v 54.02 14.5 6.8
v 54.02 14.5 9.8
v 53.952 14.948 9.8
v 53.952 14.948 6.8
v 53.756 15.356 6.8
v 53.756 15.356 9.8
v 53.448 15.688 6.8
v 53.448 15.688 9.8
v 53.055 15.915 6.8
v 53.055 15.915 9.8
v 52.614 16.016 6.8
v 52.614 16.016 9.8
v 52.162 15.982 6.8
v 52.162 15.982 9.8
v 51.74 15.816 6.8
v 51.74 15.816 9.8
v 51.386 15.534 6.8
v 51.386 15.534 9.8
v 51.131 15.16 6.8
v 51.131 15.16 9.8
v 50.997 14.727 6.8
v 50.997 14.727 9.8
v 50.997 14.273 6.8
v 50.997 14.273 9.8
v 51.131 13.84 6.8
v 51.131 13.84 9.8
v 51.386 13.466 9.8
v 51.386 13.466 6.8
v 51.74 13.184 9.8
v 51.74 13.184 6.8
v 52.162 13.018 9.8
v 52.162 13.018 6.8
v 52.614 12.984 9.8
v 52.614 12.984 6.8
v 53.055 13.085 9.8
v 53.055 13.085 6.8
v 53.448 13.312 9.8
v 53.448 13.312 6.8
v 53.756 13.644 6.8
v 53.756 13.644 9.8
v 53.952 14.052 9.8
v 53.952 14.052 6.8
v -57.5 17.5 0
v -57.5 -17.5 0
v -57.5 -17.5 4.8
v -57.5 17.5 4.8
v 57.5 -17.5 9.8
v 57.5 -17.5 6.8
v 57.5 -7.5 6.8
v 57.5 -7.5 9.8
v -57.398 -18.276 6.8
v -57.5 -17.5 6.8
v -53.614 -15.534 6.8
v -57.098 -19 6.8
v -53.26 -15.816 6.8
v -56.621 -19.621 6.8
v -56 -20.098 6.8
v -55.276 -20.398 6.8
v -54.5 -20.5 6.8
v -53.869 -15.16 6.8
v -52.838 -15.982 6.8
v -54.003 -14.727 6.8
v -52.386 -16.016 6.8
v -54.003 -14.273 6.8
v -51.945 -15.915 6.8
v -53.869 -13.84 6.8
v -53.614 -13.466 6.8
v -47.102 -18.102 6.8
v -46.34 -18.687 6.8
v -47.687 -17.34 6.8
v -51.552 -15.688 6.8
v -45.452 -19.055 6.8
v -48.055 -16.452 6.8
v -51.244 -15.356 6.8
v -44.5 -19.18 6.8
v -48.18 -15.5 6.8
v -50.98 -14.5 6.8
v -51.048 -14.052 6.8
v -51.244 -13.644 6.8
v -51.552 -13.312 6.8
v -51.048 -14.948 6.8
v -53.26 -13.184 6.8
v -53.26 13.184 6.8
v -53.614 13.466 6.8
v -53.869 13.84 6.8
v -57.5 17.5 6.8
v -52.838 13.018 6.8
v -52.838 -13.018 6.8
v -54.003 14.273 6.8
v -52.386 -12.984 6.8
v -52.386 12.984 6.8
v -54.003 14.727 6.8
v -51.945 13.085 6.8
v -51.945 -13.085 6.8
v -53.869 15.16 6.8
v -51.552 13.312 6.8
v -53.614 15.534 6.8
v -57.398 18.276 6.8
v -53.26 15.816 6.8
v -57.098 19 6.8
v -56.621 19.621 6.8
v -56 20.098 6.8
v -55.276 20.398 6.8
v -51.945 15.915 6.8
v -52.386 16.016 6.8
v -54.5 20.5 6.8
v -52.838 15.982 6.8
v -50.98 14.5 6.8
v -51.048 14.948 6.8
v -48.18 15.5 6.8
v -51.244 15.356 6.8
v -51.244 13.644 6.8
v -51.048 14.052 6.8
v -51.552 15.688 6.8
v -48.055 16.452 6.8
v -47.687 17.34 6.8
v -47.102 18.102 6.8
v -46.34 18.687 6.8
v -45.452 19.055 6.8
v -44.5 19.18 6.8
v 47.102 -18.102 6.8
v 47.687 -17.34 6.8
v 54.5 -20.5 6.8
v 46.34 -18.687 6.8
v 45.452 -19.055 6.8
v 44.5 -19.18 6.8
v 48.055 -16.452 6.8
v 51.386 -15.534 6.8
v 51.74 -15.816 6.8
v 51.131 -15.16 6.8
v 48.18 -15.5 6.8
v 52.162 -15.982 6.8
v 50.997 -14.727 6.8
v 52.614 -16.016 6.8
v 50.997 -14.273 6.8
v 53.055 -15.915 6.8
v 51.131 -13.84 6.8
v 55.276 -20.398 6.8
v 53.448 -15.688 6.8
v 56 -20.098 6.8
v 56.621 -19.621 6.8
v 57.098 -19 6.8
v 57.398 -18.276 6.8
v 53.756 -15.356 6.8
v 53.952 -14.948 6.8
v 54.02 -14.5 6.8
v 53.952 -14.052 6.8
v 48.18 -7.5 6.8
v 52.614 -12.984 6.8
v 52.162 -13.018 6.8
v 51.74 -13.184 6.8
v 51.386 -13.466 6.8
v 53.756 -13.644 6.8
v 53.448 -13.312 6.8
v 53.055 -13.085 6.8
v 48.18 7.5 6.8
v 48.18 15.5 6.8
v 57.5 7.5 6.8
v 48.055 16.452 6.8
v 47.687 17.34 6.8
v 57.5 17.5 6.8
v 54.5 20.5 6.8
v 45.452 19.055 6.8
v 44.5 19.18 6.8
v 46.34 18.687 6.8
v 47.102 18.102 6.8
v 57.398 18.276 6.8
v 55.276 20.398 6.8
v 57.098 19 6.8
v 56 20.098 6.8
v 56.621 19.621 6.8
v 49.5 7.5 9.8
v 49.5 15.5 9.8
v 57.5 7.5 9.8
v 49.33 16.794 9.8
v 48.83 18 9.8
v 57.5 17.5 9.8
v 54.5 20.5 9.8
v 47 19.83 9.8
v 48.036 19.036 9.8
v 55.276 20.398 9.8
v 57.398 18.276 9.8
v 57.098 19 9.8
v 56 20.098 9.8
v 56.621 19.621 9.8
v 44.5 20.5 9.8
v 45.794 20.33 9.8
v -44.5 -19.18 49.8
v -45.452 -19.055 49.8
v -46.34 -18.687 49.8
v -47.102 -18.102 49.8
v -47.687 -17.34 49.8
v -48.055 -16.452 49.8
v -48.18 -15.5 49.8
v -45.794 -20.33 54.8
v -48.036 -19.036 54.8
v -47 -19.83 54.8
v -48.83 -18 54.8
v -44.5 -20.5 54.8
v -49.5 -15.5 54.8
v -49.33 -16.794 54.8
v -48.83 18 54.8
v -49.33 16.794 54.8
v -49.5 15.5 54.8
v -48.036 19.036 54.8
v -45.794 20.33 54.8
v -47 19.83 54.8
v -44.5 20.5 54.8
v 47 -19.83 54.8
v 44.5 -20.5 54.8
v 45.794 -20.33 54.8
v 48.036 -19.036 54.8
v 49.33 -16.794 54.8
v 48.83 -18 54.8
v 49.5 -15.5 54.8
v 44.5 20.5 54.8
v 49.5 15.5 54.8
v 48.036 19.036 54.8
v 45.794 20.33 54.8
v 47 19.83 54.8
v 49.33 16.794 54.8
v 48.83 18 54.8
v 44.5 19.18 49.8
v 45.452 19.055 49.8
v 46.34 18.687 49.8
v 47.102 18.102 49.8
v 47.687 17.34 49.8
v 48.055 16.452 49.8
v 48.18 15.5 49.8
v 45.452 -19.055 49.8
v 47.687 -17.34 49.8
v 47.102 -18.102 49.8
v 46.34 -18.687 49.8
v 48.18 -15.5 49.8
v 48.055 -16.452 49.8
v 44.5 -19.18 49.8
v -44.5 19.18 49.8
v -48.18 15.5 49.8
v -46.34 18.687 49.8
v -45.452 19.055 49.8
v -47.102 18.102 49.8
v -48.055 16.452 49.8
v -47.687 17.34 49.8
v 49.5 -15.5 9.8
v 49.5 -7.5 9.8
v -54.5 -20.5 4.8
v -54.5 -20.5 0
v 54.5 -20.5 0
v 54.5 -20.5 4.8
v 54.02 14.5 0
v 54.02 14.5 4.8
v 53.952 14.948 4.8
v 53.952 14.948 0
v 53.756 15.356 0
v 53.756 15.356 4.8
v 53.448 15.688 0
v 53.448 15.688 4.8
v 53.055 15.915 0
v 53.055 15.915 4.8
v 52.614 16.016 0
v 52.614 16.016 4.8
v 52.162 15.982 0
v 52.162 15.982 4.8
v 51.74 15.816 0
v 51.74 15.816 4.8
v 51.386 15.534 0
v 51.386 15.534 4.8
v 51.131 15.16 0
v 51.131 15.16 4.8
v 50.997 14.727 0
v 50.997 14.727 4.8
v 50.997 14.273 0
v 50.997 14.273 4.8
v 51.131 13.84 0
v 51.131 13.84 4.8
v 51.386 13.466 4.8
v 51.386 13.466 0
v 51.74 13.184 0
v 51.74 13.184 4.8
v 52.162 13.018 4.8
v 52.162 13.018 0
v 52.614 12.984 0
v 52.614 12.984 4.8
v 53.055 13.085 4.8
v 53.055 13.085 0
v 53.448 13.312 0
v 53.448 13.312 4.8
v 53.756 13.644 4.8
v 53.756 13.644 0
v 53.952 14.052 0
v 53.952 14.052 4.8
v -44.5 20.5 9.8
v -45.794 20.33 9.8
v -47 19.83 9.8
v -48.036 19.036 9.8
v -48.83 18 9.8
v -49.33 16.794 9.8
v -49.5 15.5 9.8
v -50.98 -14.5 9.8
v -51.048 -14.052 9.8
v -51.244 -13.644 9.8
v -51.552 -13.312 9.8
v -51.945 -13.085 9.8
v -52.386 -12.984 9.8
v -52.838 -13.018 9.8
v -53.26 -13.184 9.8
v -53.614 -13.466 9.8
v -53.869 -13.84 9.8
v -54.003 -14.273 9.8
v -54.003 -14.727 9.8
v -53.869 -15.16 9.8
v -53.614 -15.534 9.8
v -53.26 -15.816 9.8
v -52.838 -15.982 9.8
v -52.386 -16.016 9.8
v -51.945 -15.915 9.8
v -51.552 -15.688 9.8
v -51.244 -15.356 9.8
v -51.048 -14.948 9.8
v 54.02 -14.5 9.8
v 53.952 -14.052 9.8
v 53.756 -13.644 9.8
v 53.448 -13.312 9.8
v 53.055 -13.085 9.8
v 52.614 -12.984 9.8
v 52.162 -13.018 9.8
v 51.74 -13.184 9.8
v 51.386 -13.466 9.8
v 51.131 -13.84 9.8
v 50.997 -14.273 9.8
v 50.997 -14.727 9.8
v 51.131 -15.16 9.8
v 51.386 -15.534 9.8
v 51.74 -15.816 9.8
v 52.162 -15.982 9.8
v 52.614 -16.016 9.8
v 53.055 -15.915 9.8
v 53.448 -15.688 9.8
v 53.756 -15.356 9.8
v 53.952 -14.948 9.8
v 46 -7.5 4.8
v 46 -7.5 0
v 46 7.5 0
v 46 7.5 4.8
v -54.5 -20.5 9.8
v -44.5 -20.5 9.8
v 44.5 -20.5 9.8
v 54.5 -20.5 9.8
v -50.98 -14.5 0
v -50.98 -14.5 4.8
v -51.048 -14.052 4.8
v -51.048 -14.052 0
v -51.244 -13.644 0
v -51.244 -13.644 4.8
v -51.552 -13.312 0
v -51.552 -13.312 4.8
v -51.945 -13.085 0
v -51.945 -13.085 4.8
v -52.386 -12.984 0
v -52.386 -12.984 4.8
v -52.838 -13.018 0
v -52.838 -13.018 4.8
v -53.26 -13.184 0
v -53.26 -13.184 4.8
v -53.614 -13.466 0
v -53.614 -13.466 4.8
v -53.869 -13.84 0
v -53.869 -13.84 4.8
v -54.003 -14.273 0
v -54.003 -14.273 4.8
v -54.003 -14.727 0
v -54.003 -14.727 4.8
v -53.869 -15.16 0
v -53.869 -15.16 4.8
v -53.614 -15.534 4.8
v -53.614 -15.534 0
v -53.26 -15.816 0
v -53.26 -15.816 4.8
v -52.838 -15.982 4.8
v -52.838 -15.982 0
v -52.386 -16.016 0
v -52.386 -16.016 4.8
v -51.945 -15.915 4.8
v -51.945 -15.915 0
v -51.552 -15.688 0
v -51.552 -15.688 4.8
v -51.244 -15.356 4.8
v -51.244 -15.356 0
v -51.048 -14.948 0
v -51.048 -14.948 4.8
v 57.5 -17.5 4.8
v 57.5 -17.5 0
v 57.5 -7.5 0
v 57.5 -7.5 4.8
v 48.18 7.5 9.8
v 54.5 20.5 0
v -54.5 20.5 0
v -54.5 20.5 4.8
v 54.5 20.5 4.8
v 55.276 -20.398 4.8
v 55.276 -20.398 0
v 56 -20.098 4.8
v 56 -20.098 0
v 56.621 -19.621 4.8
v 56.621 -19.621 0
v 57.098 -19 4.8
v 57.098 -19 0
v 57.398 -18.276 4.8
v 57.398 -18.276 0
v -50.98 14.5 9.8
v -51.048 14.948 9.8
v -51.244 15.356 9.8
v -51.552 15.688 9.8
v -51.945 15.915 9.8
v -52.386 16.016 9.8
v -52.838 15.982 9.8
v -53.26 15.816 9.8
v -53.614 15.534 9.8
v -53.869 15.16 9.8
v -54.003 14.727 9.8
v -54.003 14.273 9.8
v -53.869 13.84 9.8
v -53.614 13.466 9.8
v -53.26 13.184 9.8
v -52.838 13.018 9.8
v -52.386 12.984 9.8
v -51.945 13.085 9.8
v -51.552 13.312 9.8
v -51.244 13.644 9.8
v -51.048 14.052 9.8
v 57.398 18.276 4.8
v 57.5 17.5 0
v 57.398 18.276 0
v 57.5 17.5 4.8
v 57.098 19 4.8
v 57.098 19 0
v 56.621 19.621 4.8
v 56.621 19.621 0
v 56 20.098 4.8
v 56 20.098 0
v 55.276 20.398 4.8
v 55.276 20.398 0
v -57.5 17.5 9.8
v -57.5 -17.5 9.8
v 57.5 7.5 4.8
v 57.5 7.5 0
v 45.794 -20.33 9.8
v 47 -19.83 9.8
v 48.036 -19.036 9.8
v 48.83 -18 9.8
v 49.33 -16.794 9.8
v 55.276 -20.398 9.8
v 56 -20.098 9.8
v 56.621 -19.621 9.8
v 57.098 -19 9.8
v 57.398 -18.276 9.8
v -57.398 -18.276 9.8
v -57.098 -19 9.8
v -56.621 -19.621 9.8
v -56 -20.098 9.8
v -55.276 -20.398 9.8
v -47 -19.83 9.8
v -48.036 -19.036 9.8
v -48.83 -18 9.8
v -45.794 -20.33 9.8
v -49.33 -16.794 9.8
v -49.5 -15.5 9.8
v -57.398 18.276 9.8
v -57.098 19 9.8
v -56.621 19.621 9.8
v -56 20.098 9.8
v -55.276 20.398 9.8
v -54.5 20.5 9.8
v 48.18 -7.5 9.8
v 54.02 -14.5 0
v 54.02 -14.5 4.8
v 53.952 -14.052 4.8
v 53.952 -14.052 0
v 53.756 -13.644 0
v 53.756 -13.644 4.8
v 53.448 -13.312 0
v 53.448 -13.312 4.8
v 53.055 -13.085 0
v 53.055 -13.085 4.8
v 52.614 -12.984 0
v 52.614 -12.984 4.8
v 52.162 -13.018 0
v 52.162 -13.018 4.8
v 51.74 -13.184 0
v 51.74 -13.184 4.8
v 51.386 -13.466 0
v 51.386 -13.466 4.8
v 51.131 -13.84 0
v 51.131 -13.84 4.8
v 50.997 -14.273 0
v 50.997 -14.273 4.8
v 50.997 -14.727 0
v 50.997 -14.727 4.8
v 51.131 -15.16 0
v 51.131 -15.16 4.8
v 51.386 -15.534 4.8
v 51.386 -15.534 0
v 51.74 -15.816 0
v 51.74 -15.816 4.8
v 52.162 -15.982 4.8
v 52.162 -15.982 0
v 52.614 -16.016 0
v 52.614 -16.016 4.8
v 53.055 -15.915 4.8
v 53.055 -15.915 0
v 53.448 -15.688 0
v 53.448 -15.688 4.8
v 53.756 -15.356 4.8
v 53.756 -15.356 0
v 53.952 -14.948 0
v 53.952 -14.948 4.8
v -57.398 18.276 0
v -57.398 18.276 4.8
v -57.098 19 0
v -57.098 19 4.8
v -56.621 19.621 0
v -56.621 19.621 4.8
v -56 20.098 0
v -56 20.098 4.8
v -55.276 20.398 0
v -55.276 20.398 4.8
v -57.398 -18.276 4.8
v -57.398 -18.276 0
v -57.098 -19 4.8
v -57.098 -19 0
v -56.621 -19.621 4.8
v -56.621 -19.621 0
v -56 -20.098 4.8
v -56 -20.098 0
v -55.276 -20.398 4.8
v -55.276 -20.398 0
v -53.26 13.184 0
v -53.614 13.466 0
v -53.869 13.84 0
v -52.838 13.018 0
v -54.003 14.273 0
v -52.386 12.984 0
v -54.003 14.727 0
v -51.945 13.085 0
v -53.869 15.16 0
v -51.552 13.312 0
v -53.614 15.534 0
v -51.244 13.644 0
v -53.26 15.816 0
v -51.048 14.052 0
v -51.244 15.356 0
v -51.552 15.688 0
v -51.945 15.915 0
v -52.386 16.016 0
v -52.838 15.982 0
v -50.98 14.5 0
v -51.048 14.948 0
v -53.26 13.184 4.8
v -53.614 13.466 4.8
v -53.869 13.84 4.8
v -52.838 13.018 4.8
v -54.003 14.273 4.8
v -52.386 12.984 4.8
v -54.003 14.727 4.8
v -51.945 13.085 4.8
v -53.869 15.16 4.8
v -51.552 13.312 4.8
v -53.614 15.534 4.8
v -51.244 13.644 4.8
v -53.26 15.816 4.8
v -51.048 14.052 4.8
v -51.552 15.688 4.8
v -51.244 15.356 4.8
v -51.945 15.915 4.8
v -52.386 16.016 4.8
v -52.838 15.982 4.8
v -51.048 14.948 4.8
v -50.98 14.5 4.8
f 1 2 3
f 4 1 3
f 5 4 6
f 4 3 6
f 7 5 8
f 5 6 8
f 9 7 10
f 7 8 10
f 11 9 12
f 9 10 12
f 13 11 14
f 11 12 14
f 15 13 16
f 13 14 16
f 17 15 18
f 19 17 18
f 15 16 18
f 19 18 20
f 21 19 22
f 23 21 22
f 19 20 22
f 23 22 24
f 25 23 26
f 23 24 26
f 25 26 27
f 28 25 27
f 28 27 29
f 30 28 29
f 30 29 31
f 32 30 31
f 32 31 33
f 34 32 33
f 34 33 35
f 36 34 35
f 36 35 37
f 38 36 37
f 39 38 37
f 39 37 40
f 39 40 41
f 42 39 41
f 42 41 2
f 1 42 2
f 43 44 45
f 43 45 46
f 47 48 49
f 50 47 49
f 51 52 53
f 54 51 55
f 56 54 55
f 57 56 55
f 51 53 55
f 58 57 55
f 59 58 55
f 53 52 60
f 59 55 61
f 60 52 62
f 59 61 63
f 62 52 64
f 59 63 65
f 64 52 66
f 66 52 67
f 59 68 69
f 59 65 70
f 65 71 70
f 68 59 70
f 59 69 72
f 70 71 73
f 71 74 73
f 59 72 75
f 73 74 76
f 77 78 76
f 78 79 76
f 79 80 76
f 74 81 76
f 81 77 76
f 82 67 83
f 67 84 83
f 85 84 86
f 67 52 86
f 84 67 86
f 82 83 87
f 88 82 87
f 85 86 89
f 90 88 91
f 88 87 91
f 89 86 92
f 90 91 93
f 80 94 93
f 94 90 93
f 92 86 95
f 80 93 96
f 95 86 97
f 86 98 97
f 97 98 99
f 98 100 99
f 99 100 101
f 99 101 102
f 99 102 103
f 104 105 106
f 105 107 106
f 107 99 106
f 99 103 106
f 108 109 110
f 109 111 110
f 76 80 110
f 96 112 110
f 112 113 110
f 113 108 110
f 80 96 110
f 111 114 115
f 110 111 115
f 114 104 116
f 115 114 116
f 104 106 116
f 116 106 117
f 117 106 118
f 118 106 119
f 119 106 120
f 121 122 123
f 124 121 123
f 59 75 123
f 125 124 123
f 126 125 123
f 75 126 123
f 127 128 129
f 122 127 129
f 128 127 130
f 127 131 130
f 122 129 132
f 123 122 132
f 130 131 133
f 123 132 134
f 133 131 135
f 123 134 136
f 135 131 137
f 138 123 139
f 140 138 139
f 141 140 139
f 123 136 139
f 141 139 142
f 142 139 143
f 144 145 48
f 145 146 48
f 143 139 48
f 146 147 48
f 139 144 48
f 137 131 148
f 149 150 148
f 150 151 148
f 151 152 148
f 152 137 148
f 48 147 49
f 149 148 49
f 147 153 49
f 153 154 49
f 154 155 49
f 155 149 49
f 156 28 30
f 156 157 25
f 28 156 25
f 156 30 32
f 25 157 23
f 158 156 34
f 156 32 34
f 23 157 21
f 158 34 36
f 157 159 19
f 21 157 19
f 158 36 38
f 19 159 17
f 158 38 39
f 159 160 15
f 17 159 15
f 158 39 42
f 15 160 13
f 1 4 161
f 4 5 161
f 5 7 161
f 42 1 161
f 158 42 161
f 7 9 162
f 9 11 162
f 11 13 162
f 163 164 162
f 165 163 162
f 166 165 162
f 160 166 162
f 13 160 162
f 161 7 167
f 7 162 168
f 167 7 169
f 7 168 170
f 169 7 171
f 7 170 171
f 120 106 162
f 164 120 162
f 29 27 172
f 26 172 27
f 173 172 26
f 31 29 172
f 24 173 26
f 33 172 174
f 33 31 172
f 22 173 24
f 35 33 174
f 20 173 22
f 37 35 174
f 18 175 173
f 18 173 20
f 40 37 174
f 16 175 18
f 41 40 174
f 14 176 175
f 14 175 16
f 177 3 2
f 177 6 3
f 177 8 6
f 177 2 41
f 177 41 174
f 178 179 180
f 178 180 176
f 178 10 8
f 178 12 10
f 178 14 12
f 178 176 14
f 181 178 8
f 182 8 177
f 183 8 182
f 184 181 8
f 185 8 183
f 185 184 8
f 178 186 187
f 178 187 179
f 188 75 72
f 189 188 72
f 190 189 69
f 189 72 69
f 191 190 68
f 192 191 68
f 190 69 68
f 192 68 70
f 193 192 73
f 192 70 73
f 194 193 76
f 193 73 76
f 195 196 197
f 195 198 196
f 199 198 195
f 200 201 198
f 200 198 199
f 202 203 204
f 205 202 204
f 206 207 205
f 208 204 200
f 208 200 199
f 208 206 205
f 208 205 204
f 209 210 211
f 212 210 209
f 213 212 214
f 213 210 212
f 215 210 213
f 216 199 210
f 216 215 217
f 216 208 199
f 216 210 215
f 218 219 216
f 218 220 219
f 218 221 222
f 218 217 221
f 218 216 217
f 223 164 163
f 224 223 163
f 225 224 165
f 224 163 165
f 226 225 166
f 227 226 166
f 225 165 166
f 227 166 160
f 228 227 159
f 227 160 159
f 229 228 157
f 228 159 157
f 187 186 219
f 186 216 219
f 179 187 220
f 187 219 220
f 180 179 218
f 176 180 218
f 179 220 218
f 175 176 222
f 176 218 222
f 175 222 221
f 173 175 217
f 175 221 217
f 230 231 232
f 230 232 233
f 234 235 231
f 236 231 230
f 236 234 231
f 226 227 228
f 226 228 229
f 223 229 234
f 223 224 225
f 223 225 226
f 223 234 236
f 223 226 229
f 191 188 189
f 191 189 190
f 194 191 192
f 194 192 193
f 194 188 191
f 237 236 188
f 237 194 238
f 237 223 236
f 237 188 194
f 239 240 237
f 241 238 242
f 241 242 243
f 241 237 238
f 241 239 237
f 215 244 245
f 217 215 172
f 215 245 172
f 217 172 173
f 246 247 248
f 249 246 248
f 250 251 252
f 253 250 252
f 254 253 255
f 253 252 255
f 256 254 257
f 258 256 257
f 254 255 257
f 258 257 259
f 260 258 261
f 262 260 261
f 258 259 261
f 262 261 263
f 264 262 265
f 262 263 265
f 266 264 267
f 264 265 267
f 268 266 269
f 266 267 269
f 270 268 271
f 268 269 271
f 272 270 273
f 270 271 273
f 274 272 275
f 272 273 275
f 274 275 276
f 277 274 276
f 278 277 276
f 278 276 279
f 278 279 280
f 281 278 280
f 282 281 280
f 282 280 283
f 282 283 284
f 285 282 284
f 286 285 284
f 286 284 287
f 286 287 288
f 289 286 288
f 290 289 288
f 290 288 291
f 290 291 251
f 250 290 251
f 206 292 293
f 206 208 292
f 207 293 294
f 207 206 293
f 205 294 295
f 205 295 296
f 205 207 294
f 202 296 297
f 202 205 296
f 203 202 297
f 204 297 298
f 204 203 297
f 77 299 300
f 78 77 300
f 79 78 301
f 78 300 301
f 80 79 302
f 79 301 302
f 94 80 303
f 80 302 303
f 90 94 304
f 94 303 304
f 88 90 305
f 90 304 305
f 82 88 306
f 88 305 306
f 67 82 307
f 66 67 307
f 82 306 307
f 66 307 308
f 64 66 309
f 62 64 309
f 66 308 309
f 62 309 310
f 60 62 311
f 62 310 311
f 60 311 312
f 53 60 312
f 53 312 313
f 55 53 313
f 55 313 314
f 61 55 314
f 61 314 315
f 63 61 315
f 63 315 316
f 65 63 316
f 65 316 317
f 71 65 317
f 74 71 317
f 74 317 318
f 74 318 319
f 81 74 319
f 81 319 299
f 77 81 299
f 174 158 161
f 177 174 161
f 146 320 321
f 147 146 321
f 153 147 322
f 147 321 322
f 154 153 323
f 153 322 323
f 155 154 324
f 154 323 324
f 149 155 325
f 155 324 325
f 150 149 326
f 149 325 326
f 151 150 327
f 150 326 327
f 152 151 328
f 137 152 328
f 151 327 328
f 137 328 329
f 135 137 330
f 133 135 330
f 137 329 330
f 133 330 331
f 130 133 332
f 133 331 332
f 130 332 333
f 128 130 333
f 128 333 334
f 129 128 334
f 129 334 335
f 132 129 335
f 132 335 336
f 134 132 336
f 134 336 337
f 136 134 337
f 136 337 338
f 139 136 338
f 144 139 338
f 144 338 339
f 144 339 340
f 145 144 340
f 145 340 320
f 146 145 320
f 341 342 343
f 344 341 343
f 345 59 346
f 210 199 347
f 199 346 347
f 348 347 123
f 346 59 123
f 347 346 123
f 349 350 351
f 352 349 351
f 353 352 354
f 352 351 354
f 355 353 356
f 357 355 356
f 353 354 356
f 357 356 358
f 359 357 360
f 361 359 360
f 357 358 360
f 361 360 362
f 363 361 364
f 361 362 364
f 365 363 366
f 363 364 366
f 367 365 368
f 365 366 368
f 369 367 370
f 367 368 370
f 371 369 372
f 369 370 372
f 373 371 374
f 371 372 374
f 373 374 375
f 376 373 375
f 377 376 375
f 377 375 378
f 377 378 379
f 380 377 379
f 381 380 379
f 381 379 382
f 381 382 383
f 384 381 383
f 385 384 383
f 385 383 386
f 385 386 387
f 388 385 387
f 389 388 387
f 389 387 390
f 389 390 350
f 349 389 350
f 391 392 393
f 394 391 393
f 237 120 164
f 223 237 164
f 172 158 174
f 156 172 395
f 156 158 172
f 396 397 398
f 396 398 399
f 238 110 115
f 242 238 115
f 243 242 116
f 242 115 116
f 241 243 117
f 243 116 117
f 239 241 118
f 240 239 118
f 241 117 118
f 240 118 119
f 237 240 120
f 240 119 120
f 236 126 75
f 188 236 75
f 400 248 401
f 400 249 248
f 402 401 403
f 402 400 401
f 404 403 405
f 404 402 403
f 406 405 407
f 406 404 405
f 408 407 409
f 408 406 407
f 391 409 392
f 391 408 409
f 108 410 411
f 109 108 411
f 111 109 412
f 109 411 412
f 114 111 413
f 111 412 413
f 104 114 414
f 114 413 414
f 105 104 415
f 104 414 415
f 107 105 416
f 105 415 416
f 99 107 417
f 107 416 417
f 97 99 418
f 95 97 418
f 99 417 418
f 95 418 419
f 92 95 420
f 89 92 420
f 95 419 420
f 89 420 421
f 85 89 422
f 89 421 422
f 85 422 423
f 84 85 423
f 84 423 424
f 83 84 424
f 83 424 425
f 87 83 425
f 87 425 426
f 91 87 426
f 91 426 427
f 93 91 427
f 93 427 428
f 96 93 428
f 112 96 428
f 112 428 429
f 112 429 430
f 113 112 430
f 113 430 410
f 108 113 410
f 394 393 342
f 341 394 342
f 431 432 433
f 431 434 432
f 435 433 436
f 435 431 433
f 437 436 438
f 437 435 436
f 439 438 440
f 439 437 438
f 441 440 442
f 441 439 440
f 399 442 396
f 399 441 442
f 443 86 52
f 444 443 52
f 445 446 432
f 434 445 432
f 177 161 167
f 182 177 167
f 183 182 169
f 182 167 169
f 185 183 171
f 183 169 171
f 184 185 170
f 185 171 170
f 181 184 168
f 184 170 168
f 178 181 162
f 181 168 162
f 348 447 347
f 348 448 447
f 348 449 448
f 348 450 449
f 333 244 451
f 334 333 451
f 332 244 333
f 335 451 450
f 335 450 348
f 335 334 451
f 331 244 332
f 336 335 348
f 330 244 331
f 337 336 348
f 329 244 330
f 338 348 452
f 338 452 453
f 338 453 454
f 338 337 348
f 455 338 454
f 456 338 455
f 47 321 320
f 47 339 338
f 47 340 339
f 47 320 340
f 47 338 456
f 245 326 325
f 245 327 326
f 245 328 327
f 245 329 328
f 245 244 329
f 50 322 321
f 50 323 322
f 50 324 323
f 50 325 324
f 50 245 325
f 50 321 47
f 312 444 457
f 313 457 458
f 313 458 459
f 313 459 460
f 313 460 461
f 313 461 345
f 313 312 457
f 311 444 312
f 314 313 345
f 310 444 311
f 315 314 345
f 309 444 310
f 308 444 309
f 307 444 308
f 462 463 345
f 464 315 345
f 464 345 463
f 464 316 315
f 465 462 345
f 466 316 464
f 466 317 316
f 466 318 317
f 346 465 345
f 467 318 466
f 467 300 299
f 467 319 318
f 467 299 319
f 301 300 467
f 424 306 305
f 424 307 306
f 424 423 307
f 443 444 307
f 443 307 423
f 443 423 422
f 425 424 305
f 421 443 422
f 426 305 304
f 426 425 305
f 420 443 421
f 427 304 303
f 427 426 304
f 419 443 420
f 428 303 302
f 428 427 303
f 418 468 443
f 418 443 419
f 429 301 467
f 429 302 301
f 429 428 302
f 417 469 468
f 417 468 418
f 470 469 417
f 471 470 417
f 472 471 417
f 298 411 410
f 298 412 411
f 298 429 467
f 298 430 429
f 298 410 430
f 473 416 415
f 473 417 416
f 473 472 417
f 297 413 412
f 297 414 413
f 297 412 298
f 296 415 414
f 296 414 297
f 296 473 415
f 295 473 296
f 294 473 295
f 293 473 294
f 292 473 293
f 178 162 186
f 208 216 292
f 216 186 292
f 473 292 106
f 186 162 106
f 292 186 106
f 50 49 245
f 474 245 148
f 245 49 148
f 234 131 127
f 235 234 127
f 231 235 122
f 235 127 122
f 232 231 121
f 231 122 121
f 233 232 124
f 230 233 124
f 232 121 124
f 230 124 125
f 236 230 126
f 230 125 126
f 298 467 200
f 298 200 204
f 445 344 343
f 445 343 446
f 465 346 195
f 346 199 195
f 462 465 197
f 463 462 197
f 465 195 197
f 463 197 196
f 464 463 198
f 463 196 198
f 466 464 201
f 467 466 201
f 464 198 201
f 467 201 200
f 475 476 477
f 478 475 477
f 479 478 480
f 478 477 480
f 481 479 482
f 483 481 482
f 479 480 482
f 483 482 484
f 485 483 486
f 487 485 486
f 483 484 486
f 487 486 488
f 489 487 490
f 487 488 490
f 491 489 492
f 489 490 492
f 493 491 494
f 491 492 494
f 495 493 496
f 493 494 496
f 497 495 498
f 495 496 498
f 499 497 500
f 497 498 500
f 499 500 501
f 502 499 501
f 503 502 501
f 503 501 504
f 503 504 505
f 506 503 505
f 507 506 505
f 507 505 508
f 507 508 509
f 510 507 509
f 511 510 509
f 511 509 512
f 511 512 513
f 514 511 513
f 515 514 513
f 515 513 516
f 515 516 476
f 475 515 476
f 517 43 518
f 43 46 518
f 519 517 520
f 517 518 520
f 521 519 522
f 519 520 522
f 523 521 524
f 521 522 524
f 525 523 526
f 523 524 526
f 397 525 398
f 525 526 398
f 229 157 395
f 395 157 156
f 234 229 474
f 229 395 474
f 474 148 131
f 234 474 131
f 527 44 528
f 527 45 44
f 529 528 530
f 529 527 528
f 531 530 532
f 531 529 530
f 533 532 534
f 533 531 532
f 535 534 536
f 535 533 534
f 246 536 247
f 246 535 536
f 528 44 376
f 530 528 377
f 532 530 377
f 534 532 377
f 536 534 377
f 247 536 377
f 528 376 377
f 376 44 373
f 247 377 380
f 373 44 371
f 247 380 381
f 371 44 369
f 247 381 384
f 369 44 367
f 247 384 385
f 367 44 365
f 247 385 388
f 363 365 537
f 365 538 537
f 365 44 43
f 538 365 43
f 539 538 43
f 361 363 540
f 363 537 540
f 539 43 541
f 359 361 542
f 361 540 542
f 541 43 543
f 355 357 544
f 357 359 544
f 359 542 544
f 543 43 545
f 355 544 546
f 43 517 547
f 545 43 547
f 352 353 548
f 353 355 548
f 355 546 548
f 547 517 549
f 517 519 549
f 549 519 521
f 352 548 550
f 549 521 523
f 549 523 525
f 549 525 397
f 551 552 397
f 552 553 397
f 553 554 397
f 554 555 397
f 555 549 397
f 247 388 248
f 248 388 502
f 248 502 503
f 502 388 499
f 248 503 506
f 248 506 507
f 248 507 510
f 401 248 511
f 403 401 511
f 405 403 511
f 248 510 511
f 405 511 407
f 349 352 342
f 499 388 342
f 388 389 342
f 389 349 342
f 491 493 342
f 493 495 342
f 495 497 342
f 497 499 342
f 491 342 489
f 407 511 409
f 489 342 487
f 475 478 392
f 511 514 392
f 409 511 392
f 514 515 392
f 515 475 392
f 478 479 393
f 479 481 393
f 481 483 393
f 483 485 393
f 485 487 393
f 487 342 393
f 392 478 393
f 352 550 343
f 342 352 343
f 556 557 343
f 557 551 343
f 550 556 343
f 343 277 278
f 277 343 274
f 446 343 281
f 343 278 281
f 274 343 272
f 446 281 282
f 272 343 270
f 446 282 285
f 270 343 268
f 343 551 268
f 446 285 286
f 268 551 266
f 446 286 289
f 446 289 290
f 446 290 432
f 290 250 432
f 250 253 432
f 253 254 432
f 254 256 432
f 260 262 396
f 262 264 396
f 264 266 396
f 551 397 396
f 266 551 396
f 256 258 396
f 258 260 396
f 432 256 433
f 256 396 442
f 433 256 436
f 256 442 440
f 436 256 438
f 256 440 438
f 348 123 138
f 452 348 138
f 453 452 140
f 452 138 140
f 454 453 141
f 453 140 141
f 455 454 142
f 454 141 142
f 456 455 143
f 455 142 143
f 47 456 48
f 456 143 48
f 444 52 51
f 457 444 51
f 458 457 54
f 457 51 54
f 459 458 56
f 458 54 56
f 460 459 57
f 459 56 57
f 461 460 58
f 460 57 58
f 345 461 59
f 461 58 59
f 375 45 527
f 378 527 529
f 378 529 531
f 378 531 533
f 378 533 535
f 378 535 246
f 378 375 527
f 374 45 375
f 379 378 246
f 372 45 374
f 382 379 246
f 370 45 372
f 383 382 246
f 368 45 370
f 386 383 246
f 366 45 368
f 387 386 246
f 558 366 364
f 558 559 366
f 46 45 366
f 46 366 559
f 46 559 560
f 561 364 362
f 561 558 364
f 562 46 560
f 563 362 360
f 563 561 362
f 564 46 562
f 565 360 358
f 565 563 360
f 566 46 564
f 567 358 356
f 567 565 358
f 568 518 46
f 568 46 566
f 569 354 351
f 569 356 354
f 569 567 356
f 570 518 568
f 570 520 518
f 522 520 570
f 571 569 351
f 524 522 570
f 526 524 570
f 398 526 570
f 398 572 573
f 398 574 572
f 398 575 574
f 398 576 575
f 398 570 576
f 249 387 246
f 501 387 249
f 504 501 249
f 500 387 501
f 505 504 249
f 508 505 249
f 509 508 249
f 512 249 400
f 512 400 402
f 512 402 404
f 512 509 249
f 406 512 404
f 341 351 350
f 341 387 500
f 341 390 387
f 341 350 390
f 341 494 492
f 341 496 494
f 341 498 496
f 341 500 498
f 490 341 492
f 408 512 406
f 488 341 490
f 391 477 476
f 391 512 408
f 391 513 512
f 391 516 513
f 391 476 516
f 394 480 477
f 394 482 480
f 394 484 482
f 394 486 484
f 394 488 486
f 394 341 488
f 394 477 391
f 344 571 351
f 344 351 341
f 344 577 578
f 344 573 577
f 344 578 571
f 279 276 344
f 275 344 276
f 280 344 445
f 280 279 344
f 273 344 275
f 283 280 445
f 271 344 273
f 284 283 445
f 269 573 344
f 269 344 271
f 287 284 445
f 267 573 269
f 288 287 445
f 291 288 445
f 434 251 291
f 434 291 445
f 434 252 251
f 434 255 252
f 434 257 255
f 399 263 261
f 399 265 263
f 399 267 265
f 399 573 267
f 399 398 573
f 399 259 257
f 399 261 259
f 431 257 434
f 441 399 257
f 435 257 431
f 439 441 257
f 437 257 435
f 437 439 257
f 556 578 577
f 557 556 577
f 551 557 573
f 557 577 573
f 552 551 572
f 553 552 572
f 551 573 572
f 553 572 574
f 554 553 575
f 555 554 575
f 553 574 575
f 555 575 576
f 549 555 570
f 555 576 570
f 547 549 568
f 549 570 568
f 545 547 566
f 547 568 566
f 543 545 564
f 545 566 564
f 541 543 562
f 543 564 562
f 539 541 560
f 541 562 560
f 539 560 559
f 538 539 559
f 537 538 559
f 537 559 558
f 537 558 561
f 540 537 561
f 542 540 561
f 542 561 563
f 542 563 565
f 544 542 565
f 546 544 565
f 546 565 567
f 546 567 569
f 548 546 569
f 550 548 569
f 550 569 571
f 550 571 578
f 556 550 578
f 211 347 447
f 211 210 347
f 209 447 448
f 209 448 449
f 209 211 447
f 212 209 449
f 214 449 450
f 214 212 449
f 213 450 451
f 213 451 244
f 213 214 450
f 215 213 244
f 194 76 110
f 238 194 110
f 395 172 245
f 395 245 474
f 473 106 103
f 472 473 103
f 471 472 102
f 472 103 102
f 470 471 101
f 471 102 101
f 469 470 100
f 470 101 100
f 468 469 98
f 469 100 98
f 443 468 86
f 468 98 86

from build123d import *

# Parameters (mm, degrees)
SKETCH_1_W          = 115
SKETCH_1_H          = 41
EXTRUDE_1_DEPTH     = 4.8
FILLET_1_R          = 3
SKETCH_2_R          = 1.52
SKETCH_2_W          = 13
SKETCH_2_H          = 15
CUT_EXTRUDE_1_DEPTH = 55
EXTRUDE_2_DEPTH     = 3
SKETCH_5_W          = 99
SKETCH_5_H          = 41
EXTRUDE_3_DEPTH     = 45
SKETCH_7_R          = 1.52
CUT_EXTRUDE_2_DEPTH = 45
FILLET_2_R          = 5
CUT_EXTRUDE_4_DEPTH = 43
SKETCH_9_W          = 5
SKETCH_9_H          = 15
CUT_EXTRUDE_5_DEPTH = 9.8


with BuildPart() as part:
    # 草图1 → 凸台-拉伸1 (new body)
    with BuildSketch(Plane.XY):
        Rectangle(SKETCH_1_W, SKETCH_1_H)
    extrude(amount=EXTRUDE_1_DEPTH)

    # 圆角1
    fillet_1_edges = [part.edges().sort_by_distance(p)[0] for p in [
        (57.5, -20.5, 2.4),
        (-57.5, -20.5, 2.4),
        (-57.5, 20.5, 2.4),
        (57.5, 20.5, 2.4),
    ]]
    fillet(fillet_1_edges, radius=FILLET_1_R)

    # 草图2 → 切除-拉伸1 (cut)
    with BuildSketch(Plane.XY.offset(4.8)):
        with Locations((52.5, 14.5)):
            Circle(SKETCH_2_R)
        with Locations((-52.5, 14.5)):
            Circle(SKETCH_2_R)
        with Locations((-52.5, -14.5)):
            Circle(SKETCH_2_R)
        with Locations((52.5, -14.5)):
            Circle(SKETCH_2_R)
        with Locations((57.5, 0)):
            Rectangle(SKETCH_2_W, SKETCH_2_H)
    extrude(amount=-CUT_EXTRUDE_1_DEPTH, mode=Mode.SUBTRACT)


with BuildPart() as body_2:
    # 草图4 → 凸台-拉伸2 (new body)
    with BuildSketch(Plane.XY.offset(6.8)):
        with BuildLine():
            Line((57.5, -17.5), (57.5, -7.5))
            Line((57.5, -7.5), (51, -7.5))
            Line((51, -7.5), (51, 7.5))
            Line((51, 7.5), (57.5, 7.5))
            Line((57.5, 7.5), (57.5, 17.5))
            ThreePointArc((57.5, 17.5), (56.621320344, 19.621320344), (54.5, 20.5))
            Line((54.5, 20.5), (-54.5, 20.5))
            ThreePointArc((-54.5, 20.5), (-56.621320344, 19.621320344), (-57.5, 17.5))
            Line((-57.5, 17.5), (-57.5, -17.5))
            ThreePointArc((-57.5, -17.5), (-56.621320344, -19.621320344), (-54.5, -20.5))
            Line((-54.5, -20.5), (54.5, -20.5))
            ThreePointArc((54.5, -20.5), (56.621320344, -19.621320344), (57.5, -17.5))
        make_face()
    extrude(amount=EXTRUDE_2_DEPTH)

    # 草图5 → 凸台-拉伸3 (add)
    with BuildSketch(Plane.XY.offset(9.8)):
        Rectangle(SKETCH_5_W, SKETCH_5_H)
    extrude(amount=EXTRUDE_3_DEPTH)

    # 草图7 → 切除-拉伸2 (cut)
    with BuildSketch(Plane.XY.offset(9.8)):
        with Locations((-52.5, -14.5)):
            Circle(SKETCH_7_R)
        with Locations((-52.5, 14.5)):
            Circle(SKETCH_7_R)
        with Locations((52.5, -14.5)):
            Circle(SKETCH_7_R)
        with Locations((52.5, 14.5)):
            Circle(SKETCH_7_R)
    extrude(amount=-CUT_EXTRUDE_2_DEPTH, mode=Mode.SUBTRACT)

    # 圆角2
    fillet_2_edges = [body_2.edges().sort_by_distance(p)[0] for p in [
        (49.5, -20.5, 32.3),
        (49.5, 20.5, 32.3),
        (-49.5, 20.5, 32.3),
        (-49.5, -20.5, 32.3),
    ]]
    fillet(fillet_2_edges, radius=FILLET_2_R)

    # 草图8 → 切除-拉伸4 (cut)
    with BuildSketch(Plane(origin=(0, 0, 6.8), x_dir=(-1, 0, 0), z_dir=(0, 0, -1))):
        with BuildLine():
            Line((-48.18, 15.5), (-48.18, -15.5))
            ThreePointArc((-48.18, -15.5), (-47.102152955, -18.102152955), (-44.5, -19.18))
            Line((-44.5, -19.18), (44.5, -19.18))
            ThreePointArc((44.5, -19.18), (47.102152955, -18.102152955), (48.18, -15.5))
            Line((48.18, -15.5), (48.18, 15.5))
            ThreePointArc((48.18, 15.5), (47.102152955, 18.102152955), (44.5, 19.18))
            Line((44.5, 19.18), (-44.5, 19.18))
            ThreePointArc((-44.5, 19.18), (-47.102152955, 18.102152955), (-48.18, 15.5))
        make_face()
    extrude(amount=-CUT_EXTRUDE_4_DEPTH, mode=Mode.SUBTRACT)


with BuildPart() as cut_extrude_5_tool:
    # 草图9 → 切除-拉伸5 (new body)
    with BuildSketch(Plane(origin=(0, 0, 0), x_dir=(-1, 0, 0), z_dir=(0, 0, -1))):
        with Locations((-48.5, 0)):
            Rectangle(SKETCH_9_W, SKETCH_9_H)
    extrude(amount=-CUT_EXTRUDE_5_DEPTH)


with BuildPart() as part_1:
    add(part.part)

    # 切除-拉伸5: cut by cut_extrude_5_tool
    add(cut_extrude_5_tool.part, mode=Mode.SUBTRACT)


with BuildPart() as body_2_1:
    add(body_2.part)

    # 切除-拉伸5: cut by cut_extrude_5_tool
    add(cut_extrude_5_tool.part, mode=Mode.SUBTRACT)


solid = Compound([part_1.part, body_2_1.part])
